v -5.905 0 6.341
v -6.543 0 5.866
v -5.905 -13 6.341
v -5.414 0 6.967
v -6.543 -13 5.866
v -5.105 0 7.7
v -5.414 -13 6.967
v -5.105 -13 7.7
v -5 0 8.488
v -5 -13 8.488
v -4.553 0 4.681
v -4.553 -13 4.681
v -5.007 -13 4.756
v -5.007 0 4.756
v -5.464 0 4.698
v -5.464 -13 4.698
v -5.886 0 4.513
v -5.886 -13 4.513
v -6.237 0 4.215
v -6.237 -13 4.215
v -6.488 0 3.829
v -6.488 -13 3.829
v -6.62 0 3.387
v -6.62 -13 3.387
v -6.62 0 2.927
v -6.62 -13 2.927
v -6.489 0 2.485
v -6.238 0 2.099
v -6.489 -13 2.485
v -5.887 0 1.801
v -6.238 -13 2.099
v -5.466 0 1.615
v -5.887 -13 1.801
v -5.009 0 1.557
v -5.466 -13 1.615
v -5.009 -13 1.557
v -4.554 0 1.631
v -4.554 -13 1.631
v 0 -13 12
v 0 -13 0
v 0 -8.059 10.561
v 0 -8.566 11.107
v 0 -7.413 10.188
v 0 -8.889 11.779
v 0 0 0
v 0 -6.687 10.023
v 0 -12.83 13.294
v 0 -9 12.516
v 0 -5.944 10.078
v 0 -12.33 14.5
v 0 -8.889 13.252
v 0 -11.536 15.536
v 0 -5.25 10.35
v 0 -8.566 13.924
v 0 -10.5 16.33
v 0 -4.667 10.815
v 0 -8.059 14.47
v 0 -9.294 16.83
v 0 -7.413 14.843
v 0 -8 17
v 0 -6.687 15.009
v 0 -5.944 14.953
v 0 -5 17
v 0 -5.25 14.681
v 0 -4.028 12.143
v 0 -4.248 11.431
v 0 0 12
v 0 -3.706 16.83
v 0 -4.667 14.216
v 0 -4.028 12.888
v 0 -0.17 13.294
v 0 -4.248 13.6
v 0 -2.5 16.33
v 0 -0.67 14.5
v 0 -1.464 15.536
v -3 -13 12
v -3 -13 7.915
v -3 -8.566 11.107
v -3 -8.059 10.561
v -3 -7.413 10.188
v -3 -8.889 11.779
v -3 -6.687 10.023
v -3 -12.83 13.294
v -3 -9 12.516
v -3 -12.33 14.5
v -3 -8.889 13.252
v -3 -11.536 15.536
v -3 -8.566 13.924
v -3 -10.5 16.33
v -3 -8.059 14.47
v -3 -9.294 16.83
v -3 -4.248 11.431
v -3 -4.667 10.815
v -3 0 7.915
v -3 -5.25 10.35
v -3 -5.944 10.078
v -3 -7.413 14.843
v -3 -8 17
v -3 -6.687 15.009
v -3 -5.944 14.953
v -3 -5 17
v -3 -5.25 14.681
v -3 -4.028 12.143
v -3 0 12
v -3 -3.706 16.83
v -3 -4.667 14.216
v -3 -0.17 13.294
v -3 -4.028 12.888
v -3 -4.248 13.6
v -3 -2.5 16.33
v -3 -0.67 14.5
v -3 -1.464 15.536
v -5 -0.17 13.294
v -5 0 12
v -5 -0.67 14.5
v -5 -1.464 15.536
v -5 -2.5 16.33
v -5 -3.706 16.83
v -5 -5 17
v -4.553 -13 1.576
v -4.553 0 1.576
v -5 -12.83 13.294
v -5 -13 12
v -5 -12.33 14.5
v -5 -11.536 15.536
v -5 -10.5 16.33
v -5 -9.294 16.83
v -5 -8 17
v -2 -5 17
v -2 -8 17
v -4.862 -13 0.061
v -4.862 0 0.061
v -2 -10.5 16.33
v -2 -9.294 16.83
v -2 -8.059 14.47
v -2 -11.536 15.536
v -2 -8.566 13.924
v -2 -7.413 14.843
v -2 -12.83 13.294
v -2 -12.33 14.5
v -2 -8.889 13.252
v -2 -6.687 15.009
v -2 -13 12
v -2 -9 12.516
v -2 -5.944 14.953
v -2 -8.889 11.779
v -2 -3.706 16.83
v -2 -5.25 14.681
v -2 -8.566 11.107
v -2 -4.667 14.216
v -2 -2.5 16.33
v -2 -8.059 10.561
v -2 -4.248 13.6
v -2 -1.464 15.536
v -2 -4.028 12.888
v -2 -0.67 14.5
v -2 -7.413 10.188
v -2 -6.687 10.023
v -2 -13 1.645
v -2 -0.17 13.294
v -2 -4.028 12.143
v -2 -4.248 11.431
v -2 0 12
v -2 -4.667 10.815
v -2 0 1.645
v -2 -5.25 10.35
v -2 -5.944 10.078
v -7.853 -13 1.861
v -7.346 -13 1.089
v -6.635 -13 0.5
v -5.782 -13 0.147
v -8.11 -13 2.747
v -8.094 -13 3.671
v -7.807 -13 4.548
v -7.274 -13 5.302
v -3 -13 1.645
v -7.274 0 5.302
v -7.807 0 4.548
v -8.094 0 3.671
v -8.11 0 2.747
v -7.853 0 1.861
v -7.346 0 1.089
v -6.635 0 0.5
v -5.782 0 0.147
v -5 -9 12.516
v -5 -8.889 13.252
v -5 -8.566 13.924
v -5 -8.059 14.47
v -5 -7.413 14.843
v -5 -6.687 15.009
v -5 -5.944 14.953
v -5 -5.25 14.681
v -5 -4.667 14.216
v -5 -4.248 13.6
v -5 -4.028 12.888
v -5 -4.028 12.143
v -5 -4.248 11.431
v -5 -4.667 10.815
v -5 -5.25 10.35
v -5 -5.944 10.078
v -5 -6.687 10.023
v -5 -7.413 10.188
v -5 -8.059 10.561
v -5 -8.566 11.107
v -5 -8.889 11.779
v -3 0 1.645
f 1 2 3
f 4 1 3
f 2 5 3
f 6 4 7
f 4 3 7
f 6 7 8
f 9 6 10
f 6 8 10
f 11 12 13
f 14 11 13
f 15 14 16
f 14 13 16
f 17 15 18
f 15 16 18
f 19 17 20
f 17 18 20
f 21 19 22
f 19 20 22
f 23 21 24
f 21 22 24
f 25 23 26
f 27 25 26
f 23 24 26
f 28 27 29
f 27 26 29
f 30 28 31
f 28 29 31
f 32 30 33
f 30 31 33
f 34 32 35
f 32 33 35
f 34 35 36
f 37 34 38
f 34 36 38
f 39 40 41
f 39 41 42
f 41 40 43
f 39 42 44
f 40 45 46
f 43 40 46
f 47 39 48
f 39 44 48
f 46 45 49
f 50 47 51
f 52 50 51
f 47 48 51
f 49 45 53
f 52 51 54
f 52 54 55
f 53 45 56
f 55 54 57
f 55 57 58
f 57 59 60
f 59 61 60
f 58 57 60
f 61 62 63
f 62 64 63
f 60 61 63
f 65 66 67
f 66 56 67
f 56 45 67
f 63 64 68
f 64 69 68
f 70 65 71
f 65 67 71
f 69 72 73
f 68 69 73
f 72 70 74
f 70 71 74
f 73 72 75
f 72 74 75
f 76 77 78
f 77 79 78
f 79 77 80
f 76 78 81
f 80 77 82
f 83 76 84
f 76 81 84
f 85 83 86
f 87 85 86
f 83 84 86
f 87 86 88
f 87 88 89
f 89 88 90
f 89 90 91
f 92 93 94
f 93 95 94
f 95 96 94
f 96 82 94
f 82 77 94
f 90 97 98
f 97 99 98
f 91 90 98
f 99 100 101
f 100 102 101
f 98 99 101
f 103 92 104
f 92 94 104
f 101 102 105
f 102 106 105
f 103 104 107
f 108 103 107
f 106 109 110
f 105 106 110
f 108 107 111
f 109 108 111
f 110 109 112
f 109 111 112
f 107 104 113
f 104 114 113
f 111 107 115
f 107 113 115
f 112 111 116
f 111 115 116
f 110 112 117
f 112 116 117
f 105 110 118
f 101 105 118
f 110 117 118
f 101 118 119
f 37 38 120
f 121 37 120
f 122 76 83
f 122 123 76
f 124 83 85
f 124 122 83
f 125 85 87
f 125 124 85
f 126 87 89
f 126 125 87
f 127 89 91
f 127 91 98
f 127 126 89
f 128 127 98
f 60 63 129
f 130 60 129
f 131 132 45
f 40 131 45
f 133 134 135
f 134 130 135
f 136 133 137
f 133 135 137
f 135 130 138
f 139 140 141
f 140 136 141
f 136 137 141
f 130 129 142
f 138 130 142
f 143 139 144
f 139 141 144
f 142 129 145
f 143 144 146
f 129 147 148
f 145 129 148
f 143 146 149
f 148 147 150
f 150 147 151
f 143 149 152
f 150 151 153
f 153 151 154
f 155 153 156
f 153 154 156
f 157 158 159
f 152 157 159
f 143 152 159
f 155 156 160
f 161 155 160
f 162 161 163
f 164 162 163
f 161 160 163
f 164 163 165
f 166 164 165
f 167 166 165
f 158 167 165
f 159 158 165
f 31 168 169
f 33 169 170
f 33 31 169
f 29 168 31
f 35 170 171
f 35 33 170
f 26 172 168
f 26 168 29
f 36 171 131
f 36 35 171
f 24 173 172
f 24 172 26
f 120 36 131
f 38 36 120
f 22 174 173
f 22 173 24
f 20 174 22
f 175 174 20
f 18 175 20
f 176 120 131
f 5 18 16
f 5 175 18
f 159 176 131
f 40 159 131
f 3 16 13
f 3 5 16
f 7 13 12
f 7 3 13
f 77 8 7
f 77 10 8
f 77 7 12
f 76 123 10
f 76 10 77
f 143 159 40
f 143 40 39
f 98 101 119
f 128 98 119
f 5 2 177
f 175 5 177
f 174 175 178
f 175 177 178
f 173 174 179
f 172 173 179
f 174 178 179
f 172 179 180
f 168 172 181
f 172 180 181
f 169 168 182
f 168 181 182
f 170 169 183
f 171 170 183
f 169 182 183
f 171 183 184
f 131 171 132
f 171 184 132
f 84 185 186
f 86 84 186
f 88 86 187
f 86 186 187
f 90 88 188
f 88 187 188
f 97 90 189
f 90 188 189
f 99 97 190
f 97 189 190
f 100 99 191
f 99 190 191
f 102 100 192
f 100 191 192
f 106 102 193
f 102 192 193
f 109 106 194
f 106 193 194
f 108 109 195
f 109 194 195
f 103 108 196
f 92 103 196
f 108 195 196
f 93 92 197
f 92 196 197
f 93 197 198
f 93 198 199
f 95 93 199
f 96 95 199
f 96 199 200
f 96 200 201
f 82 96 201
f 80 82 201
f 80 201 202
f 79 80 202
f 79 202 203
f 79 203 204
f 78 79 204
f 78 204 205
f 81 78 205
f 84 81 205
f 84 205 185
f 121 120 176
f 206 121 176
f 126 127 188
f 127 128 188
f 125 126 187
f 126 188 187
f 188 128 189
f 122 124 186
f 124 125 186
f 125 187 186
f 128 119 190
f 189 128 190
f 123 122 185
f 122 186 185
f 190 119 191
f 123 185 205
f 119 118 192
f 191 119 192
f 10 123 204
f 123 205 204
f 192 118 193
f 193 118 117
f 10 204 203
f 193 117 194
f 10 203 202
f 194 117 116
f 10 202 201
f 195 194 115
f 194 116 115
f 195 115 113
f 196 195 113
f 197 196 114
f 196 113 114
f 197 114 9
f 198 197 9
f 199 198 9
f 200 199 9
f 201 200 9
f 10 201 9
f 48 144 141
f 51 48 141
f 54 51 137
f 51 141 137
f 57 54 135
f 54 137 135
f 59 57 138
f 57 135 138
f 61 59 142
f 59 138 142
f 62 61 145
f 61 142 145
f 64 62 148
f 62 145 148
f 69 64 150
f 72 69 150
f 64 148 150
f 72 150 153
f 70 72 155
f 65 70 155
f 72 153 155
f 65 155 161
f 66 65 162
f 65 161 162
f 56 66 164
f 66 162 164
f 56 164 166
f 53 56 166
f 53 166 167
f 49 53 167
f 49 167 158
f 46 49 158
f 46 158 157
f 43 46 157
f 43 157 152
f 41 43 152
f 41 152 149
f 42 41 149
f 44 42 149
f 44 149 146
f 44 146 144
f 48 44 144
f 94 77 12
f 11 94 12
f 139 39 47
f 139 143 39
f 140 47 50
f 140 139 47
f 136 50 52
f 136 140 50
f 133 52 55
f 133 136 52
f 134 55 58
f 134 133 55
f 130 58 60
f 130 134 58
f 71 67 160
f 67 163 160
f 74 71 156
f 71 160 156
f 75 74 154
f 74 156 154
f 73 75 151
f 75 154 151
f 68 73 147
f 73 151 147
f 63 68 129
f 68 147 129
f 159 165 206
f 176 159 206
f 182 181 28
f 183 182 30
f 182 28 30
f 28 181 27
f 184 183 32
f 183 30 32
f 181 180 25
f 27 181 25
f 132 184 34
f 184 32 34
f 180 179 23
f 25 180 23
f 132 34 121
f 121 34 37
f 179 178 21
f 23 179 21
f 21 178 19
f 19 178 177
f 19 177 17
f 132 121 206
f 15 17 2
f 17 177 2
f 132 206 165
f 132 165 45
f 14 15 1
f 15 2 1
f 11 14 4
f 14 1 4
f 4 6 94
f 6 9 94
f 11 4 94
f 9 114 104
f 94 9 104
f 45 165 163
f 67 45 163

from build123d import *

# Parameters (mm, degrees)
F1_DEPTH = 13
F2_R     = 1.6
F3_DEPTH = 25
F5_DEPTH = 25
F6_R     = 3
F7_R     = 5
F8_R     = 2.5
F9_DEPTH = 25


with BuildPart() as f1:
    # F0 (on Front) → F1 (new body)
    with BuildSketch(Plane.XZ):
        with BuildLine():
            Line((-4.862412, 0.061252), (0, 0))
            Line((0, 0), (0, 17))
            Line((0, 17), (-2, 17))
            Line((-2, 17), (-2, 1.645369))
            Line((-2, 1.645369), (-3, 1.645369))
            Line((-3, 1.645369), (-3, 17))
            Line((-3, 17), (-5, 17))
            Line((-5, 17), (-5, 6.256132))
            ThreePointArc((-5, 6.256132), (-8.135924, 3.087515), (-4.862412, 0.061252))
        make_face()
    extrude(amount=F1_DEPTH)

    # F2 (on face) → F3 (cut)
    with BuildSketch(Plane.XZ.offset(13)):
        with Locations((-5.036688, 3.156349)):
            Circle(F2_R)
    extrude(amount=-F3_DEPTH, mode=Mode.SUBTRACT)

    # F4 (on face) → F5 (cut)
    with BuildSketch(Plane.XZ.offset(13)):
        Polygon((-2.599795, 8.748447), (-4.55274, 4.681404), (-4.59475, 3.031561), (-2.599795, 3.031561), align=None)
        Polygon((-2.599795, 3.031561), (-4.59475, 3.031561), (-4.55274, 1.576295), (-3, 1.645369), align=None)
    extrude(amount=-F5_DEPTH, mode=Mode.SUBTRACT)

    # F6
    f6_edges = [f1.edges().sort_by_distance(p)[0] for p in [
        (-5, -6.5, 6.256132),
    ]]
    fillet(f6_edges, radius=F6_R)

    # F7
    f7_edges = [f1.edges().sort_by_distance(p)[0] for p in [
        (-4, 0, 17),
        (-1, 0, 17),
        (-4, -13, 17),
        (-1, -13, 17),
    ]]
    fillet(f7_edges, radius=F7_R)

    # F8 (on face) → F9 (cut)
    with BuildSketch(Plane(origin=(-5, 0, 0), x_dir=(0, -1, 0), z_dir=(-1, 0, 0))):
        with Locations((6.5, 12.515542)):
            Circle(F8_R)
    extrude(amount=-F9_DEPTH, mode=Mode.SUBTRACT)


solid = f1.part
